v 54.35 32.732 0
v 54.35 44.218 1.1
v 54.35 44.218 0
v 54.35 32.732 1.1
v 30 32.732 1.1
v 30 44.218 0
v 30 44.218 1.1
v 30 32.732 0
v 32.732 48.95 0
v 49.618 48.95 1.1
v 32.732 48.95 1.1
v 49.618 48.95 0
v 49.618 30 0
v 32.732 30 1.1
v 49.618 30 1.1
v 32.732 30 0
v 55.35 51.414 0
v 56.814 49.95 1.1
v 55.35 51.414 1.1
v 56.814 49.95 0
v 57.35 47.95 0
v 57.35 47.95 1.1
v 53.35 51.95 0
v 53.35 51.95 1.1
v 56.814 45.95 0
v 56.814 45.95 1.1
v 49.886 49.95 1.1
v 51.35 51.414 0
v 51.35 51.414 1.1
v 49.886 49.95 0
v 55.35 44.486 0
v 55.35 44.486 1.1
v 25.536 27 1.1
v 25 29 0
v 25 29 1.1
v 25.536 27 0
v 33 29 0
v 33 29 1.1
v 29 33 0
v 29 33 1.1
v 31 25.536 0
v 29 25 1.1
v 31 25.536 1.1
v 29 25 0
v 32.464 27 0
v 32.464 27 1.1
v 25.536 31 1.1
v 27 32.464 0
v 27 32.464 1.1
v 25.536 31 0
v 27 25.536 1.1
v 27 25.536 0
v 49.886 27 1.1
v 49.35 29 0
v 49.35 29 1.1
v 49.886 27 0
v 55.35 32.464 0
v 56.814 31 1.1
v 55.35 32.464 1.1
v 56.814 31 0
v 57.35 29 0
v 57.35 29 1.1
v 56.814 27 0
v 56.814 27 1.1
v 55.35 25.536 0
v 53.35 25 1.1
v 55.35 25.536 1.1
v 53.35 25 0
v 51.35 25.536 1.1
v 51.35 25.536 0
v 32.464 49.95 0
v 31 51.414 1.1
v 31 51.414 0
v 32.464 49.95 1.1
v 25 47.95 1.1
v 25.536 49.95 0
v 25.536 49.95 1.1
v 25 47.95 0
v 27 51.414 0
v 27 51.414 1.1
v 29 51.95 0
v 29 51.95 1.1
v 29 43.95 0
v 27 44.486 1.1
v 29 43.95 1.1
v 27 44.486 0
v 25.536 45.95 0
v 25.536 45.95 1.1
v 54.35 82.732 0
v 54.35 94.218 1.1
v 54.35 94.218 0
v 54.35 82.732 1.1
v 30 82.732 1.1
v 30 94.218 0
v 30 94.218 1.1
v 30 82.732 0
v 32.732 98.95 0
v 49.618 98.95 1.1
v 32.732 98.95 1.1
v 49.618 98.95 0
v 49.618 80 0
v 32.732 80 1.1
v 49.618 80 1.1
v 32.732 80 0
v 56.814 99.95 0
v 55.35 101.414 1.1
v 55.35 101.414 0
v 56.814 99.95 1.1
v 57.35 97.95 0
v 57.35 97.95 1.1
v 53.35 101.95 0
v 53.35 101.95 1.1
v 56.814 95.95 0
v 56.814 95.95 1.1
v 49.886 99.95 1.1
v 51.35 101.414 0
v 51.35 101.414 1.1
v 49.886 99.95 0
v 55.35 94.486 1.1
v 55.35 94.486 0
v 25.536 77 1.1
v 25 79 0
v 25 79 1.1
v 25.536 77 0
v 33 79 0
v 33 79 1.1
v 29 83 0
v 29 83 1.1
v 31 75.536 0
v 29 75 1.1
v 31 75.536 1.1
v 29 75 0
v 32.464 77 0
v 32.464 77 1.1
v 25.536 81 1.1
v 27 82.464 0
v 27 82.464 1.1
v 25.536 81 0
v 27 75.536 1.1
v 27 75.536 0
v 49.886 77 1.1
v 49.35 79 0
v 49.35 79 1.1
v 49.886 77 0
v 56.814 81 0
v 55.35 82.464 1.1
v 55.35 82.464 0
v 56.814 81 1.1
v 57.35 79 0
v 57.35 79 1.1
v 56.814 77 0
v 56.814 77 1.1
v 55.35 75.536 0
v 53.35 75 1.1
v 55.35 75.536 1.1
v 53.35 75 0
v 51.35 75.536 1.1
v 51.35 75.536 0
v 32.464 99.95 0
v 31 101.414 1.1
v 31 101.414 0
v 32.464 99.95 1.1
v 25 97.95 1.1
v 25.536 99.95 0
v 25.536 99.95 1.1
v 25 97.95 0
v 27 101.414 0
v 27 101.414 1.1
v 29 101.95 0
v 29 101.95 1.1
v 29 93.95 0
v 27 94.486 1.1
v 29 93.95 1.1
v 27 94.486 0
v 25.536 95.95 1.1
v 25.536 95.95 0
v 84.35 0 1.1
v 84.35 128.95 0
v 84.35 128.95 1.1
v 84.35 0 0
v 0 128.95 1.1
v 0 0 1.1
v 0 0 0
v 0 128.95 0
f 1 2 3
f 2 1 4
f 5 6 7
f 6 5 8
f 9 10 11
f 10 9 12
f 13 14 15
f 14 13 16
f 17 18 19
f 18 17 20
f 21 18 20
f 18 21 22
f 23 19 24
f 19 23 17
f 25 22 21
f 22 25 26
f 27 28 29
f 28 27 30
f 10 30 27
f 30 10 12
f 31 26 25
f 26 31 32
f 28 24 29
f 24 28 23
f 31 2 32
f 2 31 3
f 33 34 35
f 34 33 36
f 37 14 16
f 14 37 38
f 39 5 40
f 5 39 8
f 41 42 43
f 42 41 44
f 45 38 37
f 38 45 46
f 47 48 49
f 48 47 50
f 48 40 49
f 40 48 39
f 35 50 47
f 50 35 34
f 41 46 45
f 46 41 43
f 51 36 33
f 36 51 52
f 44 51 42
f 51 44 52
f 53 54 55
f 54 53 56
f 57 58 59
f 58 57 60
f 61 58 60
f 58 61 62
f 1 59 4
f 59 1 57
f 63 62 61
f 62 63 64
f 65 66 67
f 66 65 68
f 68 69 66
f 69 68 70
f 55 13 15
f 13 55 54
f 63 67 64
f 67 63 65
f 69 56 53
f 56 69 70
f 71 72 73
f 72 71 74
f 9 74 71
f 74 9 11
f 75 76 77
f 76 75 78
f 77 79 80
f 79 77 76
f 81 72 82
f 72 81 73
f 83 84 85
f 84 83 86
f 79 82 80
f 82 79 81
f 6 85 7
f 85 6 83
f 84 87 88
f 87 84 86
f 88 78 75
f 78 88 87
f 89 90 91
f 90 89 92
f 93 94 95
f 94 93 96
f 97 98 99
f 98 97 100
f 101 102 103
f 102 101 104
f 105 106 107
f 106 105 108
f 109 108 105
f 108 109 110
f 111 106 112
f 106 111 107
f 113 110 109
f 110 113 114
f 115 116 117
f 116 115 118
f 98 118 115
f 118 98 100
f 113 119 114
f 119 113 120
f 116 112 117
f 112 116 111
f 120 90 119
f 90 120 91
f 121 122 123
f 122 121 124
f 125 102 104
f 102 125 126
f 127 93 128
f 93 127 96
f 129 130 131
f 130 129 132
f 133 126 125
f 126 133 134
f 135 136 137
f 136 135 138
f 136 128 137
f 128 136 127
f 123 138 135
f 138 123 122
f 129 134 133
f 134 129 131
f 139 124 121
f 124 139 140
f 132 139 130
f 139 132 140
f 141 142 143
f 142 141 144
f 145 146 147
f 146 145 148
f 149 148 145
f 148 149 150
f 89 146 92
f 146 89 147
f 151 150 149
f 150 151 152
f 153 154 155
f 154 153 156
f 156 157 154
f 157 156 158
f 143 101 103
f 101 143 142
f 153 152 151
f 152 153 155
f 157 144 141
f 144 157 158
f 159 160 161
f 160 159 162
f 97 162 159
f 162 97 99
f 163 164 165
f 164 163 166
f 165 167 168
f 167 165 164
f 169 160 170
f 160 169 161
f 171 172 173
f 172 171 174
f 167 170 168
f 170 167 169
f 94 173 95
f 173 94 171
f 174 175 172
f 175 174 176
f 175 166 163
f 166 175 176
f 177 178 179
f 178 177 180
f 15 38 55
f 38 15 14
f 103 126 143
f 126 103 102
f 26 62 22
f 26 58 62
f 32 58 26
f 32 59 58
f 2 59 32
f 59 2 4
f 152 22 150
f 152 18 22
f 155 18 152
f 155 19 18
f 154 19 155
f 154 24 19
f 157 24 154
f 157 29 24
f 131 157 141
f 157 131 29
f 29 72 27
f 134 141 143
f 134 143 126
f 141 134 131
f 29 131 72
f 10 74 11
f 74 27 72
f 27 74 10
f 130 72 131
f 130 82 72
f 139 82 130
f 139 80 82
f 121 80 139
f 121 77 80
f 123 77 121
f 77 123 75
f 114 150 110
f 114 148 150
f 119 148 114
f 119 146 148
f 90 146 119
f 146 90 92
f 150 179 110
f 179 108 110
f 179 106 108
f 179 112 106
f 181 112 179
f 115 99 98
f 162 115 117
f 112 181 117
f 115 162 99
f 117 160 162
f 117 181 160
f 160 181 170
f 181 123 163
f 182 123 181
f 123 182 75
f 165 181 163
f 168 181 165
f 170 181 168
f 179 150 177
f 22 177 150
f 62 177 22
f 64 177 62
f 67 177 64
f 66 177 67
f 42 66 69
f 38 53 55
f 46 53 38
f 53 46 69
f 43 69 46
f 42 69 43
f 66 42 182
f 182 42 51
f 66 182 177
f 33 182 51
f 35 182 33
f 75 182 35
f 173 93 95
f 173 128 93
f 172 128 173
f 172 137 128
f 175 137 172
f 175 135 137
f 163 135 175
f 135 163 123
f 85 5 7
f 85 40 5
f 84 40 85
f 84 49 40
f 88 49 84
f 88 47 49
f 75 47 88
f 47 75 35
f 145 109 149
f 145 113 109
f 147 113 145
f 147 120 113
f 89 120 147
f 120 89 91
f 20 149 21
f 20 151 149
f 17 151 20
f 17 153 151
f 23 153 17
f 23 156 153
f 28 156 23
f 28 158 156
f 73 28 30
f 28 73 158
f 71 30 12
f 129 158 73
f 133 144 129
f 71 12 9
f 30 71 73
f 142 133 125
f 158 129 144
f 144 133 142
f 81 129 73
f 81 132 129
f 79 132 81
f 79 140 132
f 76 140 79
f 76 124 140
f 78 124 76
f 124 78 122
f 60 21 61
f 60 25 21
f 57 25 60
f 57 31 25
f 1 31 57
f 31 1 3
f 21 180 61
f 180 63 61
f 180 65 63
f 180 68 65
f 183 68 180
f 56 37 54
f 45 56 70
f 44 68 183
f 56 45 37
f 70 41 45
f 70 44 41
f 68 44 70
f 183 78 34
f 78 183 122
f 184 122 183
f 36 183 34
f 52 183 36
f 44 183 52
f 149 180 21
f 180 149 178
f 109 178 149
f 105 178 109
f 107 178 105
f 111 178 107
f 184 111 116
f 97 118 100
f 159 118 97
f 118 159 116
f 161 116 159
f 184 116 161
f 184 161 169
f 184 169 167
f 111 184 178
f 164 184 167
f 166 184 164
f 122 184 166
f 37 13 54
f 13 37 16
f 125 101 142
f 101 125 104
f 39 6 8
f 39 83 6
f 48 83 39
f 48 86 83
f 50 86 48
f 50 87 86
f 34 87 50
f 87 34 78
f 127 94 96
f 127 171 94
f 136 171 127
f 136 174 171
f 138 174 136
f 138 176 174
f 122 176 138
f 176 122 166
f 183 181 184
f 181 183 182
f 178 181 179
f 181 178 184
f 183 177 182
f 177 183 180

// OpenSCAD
// Holder for Ormerod prototype differential IR sensor board
// Choose layer height to be a submultiple of the thickness

thickness=1.1;	// board is 1.2mm but this part comes out slightly too thick
xborder=30;
yborder=30;
yrepeat=50;
height=24.0;
width=18.6;
clearance=0.35;
cornerRadius=4;
cornerOffset=1;
overlap=1;

module wedge(x,y,z)
{
	polyhedron(
		points=[[0,0,0],[x,0,0],[0,y,0],[0,0,z],[x,0,z],[0,y,z]],
		faces=[[0,2,1],[3,4,5],[0,1,3],[1,4,3],[1,2,4],[2,5,4],[0,3,2],[5,2,3]]
	);
}

module boardCutout()
{
	translate([0,0,-overlap])
		cube([height+clearance,width+clearance,thickness+2*overlap]);
	translate([height+clearance-cornerOffset,width+clearance-cornerOffset,-overlap])
		cylinder(r=cornerRadius,h=thickness+2*overlap,$fn=12);
	translate([-cornerOffset,-cornerOffset,-overlap])
		cylinder(r=cornerRadius,h=thickness+2*overlap,$fn=12);
	translate([height+clearance-cornerOffset,-cornerOffset,-overlap])
		cylinder(r=cornerRadius,h=thickness+2*overlap,$fn=12);
	translate([-cornerOffset,width+clearance-cornerOffset,-overlap])
		cylinder(r=cornerRadius,h=thickness+2*overlap,$fn=12);
}


difference()
{
	cube([height+2*xborder+clearance,width+2*yborder+clearance+yrepeat,thickness]);
	translate([xborder,yborder,0]) boardCutout();
	translate([xborder,yborder+yrepeat,0]) boardCutout();
}

translate([12-overlap,16-overlap,0]) wedge(10+2*overlap,10+2*overlap,thickness);
